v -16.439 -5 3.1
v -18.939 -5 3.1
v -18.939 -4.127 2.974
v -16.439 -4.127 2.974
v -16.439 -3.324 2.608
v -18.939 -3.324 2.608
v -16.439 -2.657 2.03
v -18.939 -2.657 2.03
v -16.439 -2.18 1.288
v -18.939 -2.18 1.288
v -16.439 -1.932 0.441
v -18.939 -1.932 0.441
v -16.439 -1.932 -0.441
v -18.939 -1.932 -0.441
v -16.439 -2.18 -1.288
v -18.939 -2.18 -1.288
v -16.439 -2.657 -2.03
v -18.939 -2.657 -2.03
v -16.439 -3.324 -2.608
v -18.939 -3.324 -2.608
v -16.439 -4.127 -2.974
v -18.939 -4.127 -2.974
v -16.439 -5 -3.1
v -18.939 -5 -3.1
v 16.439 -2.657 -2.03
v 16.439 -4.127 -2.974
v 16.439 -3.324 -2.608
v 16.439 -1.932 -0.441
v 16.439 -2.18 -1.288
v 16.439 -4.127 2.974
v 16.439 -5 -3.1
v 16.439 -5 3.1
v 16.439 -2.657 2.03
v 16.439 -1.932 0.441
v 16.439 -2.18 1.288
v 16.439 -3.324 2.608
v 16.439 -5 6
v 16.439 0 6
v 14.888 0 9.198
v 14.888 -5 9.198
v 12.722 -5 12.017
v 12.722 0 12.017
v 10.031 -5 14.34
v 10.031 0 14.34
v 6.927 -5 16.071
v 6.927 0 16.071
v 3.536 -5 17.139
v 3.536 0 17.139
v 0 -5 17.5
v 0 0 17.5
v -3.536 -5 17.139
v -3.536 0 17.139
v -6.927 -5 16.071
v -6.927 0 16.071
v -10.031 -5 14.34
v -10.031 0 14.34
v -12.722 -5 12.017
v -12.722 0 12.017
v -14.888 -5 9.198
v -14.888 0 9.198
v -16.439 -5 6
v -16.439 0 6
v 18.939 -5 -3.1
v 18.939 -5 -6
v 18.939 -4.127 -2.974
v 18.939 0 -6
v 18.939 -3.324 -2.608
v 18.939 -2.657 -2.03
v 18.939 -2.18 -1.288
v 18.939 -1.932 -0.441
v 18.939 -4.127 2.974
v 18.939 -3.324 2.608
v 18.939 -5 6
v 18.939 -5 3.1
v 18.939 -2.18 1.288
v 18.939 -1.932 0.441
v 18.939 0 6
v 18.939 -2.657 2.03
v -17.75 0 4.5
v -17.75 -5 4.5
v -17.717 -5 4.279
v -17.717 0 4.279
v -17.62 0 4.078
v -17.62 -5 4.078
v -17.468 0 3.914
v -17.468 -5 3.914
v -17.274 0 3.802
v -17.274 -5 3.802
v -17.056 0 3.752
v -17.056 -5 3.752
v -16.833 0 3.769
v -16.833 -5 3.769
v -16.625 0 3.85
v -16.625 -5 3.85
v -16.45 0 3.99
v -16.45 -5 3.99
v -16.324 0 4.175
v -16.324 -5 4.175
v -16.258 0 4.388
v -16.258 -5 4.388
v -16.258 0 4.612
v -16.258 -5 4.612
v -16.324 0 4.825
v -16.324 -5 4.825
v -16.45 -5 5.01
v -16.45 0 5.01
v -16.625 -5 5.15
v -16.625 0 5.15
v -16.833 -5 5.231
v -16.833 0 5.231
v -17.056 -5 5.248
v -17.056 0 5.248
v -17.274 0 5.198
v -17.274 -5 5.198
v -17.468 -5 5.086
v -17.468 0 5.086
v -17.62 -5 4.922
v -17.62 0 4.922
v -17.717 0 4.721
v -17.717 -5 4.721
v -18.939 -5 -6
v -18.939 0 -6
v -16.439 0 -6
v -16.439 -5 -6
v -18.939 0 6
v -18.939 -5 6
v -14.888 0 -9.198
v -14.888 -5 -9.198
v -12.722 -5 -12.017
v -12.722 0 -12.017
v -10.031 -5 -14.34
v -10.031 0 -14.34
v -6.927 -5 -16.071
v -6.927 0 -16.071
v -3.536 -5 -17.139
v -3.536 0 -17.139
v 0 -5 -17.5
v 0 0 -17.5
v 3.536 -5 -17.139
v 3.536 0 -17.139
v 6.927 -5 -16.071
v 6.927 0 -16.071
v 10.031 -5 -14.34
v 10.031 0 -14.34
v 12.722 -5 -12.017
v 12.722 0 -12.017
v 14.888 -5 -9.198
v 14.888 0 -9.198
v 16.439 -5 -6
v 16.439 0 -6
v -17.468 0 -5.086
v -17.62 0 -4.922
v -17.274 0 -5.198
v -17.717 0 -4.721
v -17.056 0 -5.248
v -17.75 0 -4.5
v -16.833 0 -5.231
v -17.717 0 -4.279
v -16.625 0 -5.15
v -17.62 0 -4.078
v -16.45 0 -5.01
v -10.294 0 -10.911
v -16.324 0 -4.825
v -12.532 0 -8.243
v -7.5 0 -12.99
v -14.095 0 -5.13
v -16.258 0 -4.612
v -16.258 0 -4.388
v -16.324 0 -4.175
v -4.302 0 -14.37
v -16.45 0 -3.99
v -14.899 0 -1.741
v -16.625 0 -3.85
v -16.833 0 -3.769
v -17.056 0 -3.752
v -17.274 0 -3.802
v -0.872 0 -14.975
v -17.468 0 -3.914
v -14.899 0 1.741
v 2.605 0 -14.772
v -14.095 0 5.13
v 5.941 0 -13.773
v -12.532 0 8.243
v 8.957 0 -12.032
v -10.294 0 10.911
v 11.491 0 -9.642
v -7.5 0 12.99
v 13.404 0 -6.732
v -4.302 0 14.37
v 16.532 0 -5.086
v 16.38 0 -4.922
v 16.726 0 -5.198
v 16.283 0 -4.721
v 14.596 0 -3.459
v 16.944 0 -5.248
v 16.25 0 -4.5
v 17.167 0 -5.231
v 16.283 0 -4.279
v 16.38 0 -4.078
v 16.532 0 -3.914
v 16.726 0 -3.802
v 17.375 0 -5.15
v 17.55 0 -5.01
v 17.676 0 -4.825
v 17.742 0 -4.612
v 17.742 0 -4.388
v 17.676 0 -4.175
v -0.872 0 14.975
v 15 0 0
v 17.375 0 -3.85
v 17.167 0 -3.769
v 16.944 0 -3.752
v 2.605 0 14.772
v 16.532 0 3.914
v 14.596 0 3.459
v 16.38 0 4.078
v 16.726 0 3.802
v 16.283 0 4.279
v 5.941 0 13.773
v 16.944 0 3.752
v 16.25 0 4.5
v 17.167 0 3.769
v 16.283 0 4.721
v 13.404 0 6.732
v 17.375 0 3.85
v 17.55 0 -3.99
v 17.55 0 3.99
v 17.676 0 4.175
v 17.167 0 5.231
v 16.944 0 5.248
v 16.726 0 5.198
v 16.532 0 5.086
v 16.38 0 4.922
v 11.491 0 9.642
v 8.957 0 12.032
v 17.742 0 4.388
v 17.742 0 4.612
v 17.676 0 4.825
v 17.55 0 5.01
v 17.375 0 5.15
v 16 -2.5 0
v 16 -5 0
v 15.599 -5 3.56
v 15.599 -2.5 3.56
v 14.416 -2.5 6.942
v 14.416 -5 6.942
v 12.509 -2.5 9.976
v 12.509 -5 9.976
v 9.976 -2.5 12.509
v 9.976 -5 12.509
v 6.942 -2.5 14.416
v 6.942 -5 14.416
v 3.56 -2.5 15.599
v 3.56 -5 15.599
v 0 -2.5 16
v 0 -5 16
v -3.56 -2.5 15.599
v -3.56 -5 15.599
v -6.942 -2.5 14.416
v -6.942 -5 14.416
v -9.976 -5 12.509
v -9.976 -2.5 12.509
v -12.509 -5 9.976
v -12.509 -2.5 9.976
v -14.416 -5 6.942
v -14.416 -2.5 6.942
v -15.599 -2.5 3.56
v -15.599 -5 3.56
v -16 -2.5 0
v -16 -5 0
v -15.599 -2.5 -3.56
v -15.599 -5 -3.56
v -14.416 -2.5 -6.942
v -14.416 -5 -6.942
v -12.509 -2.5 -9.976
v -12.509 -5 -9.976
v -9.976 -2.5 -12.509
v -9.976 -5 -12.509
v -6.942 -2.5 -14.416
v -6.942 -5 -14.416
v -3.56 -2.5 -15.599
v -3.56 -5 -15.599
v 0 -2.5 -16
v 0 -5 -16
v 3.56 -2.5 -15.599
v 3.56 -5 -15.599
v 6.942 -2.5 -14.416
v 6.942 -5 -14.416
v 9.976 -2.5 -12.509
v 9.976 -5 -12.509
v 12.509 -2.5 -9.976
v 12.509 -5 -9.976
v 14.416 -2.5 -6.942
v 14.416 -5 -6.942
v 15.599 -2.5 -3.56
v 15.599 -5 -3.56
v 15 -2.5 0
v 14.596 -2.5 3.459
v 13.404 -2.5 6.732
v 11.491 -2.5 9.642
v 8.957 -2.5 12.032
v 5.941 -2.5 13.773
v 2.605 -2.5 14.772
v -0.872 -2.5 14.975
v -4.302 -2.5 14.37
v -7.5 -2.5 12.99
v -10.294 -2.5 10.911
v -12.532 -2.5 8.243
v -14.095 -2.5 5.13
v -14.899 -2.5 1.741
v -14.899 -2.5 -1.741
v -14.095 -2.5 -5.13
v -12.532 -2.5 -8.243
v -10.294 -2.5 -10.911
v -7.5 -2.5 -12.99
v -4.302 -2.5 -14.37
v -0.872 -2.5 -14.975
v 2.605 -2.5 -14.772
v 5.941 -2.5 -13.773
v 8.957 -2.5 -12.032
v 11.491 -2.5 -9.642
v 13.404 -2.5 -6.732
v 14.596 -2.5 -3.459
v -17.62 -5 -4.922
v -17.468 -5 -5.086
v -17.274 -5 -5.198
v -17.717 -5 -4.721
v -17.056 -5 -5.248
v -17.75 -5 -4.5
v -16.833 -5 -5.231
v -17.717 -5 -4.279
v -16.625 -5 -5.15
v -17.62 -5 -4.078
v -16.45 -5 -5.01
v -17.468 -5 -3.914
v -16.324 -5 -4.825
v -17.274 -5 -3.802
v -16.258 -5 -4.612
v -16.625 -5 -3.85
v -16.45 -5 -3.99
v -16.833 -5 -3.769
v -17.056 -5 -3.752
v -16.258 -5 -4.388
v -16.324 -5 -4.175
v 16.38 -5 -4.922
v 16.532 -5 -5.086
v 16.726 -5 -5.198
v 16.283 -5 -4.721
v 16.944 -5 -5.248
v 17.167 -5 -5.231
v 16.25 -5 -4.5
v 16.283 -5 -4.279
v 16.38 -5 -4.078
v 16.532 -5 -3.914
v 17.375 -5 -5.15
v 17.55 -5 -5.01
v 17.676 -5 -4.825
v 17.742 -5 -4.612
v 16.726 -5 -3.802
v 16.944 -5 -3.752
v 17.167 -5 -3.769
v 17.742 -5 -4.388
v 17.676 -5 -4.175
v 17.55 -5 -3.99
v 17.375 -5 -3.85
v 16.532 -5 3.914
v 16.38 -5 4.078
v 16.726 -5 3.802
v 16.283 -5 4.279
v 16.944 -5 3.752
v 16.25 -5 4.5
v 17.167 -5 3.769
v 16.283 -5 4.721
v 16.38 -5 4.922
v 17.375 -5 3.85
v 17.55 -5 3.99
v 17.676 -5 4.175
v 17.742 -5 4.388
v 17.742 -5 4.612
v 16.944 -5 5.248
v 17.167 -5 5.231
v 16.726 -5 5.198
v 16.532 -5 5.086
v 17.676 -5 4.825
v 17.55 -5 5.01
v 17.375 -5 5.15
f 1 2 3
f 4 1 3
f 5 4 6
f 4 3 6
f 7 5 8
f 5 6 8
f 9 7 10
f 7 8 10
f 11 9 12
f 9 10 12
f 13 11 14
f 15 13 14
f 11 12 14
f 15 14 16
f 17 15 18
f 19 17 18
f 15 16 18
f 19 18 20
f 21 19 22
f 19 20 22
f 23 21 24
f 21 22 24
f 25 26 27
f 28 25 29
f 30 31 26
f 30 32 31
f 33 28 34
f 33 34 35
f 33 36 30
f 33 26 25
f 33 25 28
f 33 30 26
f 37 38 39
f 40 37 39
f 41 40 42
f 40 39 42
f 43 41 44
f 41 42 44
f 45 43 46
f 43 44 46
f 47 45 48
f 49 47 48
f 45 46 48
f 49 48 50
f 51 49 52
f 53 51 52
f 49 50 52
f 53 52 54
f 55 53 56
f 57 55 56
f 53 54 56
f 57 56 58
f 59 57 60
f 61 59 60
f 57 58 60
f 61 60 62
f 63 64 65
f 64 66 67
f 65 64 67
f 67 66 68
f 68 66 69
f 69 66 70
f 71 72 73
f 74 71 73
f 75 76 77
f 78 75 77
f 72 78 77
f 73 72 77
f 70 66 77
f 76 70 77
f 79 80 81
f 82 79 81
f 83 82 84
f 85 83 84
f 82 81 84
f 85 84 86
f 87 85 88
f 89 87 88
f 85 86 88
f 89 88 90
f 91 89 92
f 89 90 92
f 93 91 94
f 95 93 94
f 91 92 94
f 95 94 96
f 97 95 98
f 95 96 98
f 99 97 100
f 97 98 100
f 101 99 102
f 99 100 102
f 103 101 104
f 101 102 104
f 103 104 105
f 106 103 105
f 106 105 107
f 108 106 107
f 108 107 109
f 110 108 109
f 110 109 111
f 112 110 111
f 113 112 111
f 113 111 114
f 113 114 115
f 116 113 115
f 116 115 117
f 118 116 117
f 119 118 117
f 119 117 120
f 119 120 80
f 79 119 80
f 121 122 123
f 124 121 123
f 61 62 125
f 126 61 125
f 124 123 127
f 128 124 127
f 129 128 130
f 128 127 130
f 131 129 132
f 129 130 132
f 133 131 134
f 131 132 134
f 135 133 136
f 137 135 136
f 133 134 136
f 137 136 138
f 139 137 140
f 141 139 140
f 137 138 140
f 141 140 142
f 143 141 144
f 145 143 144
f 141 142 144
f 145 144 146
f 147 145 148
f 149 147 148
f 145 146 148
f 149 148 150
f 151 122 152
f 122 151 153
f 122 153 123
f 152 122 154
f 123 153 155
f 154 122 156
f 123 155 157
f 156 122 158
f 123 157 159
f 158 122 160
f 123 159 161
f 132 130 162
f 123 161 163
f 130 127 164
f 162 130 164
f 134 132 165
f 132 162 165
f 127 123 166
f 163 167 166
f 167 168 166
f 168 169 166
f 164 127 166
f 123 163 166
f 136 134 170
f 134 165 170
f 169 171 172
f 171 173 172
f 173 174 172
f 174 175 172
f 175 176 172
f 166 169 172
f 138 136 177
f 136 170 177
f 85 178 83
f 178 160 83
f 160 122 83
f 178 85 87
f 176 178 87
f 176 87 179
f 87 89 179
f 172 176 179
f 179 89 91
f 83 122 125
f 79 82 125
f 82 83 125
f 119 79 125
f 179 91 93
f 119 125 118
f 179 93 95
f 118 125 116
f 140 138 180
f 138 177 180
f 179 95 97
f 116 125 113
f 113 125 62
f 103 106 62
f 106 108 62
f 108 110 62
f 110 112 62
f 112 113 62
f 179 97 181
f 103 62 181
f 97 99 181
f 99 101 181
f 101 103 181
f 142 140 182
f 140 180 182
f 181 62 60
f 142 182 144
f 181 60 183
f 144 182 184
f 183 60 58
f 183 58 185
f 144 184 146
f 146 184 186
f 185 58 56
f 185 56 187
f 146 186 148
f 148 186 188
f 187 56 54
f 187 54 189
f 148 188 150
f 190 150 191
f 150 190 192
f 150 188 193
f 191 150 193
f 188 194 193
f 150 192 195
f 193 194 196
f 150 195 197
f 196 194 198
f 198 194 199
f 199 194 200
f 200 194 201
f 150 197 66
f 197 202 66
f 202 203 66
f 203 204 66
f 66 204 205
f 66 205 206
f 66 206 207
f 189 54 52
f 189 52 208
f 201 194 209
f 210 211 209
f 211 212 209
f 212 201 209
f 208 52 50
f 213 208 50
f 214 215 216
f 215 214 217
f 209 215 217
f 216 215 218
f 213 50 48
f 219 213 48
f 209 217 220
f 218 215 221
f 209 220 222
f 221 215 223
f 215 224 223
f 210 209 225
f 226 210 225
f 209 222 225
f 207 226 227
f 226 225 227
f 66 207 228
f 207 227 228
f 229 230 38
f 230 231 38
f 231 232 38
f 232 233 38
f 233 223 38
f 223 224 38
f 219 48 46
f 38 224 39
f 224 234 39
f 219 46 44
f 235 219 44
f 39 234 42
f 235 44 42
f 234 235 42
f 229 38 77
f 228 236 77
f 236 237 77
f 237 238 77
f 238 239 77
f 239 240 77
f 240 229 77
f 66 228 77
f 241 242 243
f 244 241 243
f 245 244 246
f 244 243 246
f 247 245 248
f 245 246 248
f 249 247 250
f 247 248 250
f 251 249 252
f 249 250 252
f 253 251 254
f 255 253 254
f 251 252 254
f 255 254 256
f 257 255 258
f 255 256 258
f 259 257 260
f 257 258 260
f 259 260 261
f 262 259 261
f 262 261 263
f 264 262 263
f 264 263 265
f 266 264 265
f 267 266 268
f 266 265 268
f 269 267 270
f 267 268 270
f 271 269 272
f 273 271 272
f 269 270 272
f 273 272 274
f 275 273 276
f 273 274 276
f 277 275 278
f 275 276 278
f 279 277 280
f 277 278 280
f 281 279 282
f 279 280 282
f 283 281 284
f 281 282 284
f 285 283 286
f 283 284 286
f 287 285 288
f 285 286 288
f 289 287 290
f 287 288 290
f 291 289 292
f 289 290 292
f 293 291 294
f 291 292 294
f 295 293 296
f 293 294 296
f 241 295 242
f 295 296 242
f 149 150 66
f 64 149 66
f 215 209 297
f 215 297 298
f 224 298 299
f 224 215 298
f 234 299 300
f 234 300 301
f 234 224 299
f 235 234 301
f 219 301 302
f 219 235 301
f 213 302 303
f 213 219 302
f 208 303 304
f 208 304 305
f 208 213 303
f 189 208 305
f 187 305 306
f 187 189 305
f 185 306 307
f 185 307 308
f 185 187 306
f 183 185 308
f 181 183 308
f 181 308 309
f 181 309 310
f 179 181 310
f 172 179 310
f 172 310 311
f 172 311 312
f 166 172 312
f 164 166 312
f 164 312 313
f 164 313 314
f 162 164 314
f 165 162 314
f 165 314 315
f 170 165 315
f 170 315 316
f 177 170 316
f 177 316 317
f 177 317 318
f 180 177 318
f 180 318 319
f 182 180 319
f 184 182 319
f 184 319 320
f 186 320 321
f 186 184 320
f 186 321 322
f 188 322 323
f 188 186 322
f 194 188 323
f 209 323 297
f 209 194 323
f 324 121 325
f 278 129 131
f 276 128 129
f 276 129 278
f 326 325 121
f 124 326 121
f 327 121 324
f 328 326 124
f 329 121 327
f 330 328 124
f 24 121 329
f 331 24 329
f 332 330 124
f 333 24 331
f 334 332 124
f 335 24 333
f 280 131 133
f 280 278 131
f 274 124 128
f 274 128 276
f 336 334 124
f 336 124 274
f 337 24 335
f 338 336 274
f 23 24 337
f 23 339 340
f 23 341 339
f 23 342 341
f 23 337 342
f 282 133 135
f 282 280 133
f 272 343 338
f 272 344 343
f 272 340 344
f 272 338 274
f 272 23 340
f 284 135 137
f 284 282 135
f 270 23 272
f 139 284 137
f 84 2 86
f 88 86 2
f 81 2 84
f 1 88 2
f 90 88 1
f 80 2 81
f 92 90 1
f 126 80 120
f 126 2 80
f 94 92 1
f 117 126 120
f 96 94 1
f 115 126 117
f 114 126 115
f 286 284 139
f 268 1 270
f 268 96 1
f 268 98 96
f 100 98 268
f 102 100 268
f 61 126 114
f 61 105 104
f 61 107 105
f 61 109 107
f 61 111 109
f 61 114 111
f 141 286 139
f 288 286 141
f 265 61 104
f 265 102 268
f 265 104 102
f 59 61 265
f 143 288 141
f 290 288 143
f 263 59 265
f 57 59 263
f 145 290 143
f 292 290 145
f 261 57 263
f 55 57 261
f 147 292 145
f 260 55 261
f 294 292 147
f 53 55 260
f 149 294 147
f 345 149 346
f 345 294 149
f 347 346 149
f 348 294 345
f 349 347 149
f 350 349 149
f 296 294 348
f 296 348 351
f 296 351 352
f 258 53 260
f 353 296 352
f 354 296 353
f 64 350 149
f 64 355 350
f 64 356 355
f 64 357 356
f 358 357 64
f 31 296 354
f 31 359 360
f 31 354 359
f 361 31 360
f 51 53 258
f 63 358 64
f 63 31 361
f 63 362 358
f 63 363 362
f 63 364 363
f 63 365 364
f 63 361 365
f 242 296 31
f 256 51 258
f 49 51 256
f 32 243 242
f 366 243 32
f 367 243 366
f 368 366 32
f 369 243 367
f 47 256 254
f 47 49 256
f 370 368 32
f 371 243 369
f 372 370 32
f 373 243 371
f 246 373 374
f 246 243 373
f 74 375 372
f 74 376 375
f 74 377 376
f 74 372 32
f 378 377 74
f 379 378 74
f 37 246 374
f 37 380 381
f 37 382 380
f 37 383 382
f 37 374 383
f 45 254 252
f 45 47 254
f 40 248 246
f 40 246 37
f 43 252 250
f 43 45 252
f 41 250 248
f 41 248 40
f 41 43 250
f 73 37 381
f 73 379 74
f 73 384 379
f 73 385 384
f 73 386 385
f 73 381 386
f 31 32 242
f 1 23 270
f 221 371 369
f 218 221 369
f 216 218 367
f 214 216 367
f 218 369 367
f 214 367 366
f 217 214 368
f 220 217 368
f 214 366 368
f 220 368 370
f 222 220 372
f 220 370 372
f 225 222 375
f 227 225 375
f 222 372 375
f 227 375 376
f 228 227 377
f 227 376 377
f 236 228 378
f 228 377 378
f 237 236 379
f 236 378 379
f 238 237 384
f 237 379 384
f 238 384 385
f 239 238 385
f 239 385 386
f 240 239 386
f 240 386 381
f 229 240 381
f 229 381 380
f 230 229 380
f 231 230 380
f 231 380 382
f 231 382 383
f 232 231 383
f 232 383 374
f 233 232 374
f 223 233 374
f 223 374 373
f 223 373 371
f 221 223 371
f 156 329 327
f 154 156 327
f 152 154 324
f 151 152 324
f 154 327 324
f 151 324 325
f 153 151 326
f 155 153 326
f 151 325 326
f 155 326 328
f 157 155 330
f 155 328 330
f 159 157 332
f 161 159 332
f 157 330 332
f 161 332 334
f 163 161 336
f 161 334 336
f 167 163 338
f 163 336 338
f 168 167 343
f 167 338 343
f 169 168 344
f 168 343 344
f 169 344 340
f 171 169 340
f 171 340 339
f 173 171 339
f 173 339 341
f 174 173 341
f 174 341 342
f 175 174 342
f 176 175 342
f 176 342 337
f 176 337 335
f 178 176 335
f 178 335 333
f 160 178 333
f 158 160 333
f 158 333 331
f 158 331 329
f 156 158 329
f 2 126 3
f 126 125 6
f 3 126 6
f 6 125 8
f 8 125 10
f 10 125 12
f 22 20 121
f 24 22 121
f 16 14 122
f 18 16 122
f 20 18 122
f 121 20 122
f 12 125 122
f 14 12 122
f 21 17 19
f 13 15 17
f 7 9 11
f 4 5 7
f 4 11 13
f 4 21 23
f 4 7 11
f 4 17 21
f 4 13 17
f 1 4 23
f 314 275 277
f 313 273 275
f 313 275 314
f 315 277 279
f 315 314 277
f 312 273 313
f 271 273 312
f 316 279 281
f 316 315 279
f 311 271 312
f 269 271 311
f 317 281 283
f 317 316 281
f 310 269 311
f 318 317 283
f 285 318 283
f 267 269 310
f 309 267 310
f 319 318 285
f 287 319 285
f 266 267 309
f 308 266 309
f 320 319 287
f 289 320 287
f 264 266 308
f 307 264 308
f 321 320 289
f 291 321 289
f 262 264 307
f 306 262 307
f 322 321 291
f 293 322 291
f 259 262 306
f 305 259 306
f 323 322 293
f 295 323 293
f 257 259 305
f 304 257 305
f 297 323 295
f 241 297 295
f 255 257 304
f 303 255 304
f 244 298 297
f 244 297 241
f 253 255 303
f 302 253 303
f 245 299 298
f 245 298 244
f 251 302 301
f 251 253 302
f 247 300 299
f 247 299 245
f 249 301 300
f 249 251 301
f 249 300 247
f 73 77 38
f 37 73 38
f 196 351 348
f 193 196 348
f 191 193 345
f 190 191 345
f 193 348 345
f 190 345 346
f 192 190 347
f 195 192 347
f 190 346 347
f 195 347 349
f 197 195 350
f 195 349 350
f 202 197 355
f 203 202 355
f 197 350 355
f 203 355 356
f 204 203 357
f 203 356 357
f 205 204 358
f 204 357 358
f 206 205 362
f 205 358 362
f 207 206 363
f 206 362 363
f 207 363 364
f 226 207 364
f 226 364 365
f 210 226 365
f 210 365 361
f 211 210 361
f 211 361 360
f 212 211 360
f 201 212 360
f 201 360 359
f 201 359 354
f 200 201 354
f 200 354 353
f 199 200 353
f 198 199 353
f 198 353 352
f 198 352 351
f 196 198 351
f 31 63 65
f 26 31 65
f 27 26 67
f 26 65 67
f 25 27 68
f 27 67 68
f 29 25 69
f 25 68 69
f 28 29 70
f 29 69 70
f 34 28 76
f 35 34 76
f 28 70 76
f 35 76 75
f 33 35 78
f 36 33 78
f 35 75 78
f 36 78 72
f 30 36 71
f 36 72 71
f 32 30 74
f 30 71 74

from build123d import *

# Parameters (mm, degrees)
F0_R     = 15
F1_DEPTH = 5
F2_R     = 16
F2_R_2   = 15
F3_DEPTH = 2.5
F5_DEPTH = 2.5
F7_DEPTH = 2.5
F9_D     = 1.5


with BuildPart() as f1:
    # F0 (on Front) → F1 (new body)
    with BuildSketch(Plane.XZ):
        with BuildLine():
            Line((-18.939282, -6), (-16.439282, -6))
            ThreePointArc((-16.439282, -6), (0, -17.5), (16.439282, -6))
            Line((16.439282, -6), (18.939282, -6))
            Line((18.939282, -6), (18.939282, 6))
            Line((18.939282, 6), (16.439282, 6))
            ThreePointArc((16.439282, 6), (0, 17.5), (-16.439282, 6))
            Line((-16.439282, 6), (-18.939282, 6))
            Line((-18.939282, 6), (-18.939282, -6))
        make_face()
        Circle(F0_R, mode=Mode.SUBTRACT)
    extrude(amount=F1_DEPTH)

    # F2 (on face) → F3 (cut)
    with BuildSketch(Plane.XZ.offset(5)):
        Circle(F2_R)
        Circle(F2_R_2, mode=Mode.SUBTRACT)
    extrude(amount=-F3_DEPTH, mode=Mode.SUBTRACT)

    # F4 (on face) → F5 (cut)
    with BuildSketch(Plane(origin=(-18.939282, 0, 0), x_dir=(0, -1, 0), z_dir=(-1, 0, 0))):
        with BuildLine():
            Line((5, -3.1), (5, 3.1))
            ThreePointArc((5, 3.1), (1.9, 0), (5, -3.1))
        make_face()
    extrude(amount=-F5_DEPTH, mode=Mode.SUBTRACT)

    # F6 (on face) → F7 (cut)
    with BuildSketch(Plane.YZ.offset(18.939282)):
        with BuildLine():
            ThreePointArc((-5, -3.1), (-1.9, 0), (-5, 3.1))
            Line((-5, 3.1), (-5, -3.1))
        make_face()
    extrude(amount=-F7_DEPTH, mode=Mode.SUBTRACT)

    # F9 (through all)
    with Locations(Plane(origin=(0, 0, 0), x_dir=(1, 0, 0), z_dir=(0, 1, 0))):
        with Locations((-17, 4.5), (-17, -4.5), (17, -4.5), (17, 4.5)):
            Hole(F9_D / 2)


solid = f1.part
